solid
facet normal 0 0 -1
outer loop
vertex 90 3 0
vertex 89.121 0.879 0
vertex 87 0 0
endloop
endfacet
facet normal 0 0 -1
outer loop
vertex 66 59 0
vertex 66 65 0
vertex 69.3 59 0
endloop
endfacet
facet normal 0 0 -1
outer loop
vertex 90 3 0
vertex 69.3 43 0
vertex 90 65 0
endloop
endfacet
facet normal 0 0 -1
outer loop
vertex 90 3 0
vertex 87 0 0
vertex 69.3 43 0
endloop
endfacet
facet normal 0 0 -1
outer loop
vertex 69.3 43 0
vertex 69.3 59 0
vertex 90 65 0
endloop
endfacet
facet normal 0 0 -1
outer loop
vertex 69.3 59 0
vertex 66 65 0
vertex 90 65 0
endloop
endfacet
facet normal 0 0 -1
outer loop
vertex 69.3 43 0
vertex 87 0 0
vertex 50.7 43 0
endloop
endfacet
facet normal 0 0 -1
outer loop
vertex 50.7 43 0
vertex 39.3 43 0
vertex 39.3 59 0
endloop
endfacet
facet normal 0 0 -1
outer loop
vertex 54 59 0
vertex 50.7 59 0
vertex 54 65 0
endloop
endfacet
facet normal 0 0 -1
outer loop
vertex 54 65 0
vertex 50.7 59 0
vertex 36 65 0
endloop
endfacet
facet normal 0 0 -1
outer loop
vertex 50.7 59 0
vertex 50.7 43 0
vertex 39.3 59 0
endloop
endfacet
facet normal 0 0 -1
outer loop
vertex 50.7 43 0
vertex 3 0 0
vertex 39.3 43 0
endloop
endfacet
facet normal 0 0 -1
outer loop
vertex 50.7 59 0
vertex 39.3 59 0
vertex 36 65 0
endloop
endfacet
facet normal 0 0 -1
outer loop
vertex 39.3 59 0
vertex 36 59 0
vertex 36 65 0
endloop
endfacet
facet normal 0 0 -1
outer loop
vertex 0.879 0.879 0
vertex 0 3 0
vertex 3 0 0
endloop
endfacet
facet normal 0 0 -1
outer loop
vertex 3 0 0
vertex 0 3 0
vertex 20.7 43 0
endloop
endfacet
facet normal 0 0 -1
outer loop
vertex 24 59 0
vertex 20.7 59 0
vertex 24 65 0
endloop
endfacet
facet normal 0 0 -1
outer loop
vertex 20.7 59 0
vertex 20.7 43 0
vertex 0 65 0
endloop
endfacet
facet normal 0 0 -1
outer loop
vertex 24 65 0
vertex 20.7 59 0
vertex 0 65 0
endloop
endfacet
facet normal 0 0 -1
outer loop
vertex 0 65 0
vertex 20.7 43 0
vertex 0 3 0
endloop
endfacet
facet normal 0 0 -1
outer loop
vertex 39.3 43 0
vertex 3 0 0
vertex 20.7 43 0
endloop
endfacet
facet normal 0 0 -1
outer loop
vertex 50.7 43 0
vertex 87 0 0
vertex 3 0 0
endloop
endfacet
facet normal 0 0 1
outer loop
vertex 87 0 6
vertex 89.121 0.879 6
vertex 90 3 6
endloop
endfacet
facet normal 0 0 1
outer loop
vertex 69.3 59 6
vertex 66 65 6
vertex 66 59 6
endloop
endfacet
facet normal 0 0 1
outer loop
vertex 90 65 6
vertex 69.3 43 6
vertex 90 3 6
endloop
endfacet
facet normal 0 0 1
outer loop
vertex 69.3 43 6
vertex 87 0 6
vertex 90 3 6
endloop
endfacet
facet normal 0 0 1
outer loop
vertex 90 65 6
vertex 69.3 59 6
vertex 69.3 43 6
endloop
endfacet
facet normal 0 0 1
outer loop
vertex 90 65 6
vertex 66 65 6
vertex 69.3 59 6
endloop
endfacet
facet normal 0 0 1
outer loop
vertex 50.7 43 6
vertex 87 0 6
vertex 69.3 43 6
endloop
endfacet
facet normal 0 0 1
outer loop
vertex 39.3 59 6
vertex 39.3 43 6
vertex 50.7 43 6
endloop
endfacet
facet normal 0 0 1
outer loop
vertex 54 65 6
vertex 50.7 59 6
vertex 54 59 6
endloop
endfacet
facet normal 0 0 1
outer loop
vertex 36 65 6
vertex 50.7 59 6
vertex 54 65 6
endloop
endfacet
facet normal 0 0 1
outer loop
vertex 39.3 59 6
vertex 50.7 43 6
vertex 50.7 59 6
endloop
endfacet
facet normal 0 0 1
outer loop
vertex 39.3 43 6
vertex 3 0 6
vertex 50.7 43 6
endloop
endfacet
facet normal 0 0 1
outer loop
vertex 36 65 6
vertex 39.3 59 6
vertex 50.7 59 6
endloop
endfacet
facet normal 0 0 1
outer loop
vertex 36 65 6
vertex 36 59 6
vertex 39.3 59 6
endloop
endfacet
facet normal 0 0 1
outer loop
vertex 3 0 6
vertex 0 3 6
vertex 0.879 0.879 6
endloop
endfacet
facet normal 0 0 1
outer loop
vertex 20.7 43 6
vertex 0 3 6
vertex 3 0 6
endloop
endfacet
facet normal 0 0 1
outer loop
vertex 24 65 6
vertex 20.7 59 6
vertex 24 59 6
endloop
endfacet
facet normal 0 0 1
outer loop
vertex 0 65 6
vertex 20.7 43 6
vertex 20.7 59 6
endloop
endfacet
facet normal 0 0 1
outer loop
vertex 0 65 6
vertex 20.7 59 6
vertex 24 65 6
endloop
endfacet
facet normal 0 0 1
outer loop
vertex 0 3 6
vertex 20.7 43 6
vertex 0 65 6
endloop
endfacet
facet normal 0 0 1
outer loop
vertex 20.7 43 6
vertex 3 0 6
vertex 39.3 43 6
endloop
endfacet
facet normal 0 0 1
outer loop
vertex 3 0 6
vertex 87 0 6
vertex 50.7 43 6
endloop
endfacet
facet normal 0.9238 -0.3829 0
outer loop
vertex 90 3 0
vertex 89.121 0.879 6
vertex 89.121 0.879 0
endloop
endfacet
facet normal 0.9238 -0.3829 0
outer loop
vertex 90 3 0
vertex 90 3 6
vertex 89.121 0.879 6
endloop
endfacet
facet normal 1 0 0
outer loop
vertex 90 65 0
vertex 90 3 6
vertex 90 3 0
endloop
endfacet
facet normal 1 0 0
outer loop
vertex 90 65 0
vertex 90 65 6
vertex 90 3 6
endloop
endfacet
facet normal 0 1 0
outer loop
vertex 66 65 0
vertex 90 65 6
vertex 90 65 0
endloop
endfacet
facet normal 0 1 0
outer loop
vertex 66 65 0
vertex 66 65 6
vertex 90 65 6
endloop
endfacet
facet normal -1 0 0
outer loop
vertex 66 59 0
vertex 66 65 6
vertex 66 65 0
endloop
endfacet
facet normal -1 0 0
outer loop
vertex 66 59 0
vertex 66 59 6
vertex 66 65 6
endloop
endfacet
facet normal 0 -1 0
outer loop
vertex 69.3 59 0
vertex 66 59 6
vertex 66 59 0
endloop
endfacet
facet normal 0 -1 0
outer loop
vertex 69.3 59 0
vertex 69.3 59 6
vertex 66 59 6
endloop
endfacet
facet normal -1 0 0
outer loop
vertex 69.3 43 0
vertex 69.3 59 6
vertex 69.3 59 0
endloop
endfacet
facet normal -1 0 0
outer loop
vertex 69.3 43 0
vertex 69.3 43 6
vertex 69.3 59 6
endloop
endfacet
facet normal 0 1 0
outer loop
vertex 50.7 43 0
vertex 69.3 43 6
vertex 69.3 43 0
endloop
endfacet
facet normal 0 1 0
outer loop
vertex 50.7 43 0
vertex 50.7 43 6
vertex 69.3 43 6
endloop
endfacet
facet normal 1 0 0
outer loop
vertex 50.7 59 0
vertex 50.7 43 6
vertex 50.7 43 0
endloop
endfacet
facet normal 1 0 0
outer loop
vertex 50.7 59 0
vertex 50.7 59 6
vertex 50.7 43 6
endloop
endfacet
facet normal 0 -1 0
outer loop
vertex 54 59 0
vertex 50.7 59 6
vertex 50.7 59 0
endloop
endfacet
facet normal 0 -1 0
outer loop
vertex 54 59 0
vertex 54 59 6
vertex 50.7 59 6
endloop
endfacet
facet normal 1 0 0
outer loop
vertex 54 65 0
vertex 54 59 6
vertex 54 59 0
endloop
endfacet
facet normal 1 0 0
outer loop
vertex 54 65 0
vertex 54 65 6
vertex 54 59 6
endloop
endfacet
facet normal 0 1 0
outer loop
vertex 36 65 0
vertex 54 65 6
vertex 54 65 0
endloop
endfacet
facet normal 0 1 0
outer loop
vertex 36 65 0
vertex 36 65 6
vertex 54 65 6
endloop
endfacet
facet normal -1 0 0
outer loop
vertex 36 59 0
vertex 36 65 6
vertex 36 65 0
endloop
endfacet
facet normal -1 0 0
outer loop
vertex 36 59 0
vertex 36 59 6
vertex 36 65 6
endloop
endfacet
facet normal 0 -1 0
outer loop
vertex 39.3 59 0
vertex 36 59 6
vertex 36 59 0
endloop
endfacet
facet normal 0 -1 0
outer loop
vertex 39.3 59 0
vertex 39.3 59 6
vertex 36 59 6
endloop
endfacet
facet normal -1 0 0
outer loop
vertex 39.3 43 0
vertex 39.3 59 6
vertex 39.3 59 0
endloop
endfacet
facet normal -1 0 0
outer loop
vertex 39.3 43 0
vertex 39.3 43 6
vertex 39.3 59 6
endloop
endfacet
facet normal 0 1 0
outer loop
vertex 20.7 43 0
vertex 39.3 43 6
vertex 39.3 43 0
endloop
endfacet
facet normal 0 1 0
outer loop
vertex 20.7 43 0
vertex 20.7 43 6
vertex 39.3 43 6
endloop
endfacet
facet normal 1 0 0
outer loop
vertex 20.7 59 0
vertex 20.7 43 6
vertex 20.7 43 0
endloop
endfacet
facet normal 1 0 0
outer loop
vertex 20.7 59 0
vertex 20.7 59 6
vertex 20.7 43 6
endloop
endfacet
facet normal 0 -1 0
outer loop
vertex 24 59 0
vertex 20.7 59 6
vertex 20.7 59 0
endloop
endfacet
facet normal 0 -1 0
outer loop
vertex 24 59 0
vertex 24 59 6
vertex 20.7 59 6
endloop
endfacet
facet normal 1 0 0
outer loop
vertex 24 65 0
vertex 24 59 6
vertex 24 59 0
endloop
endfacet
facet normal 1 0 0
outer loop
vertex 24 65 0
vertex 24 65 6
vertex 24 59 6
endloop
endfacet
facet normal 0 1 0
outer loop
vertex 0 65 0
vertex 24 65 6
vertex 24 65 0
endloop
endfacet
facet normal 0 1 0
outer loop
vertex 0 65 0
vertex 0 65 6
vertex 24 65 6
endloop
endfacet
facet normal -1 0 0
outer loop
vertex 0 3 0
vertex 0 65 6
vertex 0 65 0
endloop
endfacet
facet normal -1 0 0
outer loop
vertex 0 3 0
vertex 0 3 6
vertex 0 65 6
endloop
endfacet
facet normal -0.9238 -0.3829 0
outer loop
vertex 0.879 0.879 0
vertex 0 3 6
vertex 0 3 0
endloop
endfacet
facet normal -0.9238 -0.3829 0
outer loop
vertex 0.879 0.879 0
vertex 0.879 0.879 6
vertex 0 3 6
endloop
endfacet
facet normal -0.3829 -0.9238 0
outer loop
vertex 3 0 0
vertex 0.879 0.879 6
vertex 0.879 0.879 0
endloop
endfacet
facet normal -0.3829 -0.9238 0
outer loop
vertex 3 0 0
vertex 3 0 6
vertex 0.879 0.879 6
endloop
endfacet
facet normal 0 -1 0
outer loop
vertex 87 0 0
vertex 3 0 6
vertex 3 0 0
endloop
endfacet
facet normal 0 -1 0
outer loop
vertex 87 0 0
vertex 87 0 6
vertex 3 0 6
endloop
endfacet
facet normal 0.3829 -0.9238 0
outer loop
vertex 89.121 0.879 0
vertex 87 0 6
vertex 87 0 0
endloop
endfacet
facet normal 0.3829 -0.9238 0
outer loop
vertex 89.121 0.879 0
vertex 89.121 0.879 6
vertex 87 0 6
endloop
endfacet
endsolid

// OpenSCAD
$fn = 32;

// ----------------------------------------------------------------------
// Window plate: 90 x 65 mm, 2 open windows
// ----------------------------------------------------------------------

// --- parameters (mm) ---
profile_height = 6;       // extrusion height
profile_points = 24;      // points of the closed outline

profile = [[0, 3], [0.879, 0.879], [3, 0], [87, 0], [89.121, 0.879], [90, 3], [90, 65], [66, 65], [66, 59], [69.3, 59], [69.3, 43], [50.7, 43], [50.7, 59], [54, 59], [54, 65], [36, 65], [36, 59], [39.3, 59], [39.3, 43], [20.7, 43], [20.7, 59], [24, 59], [24, 65], [0, 65]];  // single closed polygon, 24 points, counter clockwise

// --- the one profile operation ---
linear_extrude(height = profile_height) polygon(points = profile);
